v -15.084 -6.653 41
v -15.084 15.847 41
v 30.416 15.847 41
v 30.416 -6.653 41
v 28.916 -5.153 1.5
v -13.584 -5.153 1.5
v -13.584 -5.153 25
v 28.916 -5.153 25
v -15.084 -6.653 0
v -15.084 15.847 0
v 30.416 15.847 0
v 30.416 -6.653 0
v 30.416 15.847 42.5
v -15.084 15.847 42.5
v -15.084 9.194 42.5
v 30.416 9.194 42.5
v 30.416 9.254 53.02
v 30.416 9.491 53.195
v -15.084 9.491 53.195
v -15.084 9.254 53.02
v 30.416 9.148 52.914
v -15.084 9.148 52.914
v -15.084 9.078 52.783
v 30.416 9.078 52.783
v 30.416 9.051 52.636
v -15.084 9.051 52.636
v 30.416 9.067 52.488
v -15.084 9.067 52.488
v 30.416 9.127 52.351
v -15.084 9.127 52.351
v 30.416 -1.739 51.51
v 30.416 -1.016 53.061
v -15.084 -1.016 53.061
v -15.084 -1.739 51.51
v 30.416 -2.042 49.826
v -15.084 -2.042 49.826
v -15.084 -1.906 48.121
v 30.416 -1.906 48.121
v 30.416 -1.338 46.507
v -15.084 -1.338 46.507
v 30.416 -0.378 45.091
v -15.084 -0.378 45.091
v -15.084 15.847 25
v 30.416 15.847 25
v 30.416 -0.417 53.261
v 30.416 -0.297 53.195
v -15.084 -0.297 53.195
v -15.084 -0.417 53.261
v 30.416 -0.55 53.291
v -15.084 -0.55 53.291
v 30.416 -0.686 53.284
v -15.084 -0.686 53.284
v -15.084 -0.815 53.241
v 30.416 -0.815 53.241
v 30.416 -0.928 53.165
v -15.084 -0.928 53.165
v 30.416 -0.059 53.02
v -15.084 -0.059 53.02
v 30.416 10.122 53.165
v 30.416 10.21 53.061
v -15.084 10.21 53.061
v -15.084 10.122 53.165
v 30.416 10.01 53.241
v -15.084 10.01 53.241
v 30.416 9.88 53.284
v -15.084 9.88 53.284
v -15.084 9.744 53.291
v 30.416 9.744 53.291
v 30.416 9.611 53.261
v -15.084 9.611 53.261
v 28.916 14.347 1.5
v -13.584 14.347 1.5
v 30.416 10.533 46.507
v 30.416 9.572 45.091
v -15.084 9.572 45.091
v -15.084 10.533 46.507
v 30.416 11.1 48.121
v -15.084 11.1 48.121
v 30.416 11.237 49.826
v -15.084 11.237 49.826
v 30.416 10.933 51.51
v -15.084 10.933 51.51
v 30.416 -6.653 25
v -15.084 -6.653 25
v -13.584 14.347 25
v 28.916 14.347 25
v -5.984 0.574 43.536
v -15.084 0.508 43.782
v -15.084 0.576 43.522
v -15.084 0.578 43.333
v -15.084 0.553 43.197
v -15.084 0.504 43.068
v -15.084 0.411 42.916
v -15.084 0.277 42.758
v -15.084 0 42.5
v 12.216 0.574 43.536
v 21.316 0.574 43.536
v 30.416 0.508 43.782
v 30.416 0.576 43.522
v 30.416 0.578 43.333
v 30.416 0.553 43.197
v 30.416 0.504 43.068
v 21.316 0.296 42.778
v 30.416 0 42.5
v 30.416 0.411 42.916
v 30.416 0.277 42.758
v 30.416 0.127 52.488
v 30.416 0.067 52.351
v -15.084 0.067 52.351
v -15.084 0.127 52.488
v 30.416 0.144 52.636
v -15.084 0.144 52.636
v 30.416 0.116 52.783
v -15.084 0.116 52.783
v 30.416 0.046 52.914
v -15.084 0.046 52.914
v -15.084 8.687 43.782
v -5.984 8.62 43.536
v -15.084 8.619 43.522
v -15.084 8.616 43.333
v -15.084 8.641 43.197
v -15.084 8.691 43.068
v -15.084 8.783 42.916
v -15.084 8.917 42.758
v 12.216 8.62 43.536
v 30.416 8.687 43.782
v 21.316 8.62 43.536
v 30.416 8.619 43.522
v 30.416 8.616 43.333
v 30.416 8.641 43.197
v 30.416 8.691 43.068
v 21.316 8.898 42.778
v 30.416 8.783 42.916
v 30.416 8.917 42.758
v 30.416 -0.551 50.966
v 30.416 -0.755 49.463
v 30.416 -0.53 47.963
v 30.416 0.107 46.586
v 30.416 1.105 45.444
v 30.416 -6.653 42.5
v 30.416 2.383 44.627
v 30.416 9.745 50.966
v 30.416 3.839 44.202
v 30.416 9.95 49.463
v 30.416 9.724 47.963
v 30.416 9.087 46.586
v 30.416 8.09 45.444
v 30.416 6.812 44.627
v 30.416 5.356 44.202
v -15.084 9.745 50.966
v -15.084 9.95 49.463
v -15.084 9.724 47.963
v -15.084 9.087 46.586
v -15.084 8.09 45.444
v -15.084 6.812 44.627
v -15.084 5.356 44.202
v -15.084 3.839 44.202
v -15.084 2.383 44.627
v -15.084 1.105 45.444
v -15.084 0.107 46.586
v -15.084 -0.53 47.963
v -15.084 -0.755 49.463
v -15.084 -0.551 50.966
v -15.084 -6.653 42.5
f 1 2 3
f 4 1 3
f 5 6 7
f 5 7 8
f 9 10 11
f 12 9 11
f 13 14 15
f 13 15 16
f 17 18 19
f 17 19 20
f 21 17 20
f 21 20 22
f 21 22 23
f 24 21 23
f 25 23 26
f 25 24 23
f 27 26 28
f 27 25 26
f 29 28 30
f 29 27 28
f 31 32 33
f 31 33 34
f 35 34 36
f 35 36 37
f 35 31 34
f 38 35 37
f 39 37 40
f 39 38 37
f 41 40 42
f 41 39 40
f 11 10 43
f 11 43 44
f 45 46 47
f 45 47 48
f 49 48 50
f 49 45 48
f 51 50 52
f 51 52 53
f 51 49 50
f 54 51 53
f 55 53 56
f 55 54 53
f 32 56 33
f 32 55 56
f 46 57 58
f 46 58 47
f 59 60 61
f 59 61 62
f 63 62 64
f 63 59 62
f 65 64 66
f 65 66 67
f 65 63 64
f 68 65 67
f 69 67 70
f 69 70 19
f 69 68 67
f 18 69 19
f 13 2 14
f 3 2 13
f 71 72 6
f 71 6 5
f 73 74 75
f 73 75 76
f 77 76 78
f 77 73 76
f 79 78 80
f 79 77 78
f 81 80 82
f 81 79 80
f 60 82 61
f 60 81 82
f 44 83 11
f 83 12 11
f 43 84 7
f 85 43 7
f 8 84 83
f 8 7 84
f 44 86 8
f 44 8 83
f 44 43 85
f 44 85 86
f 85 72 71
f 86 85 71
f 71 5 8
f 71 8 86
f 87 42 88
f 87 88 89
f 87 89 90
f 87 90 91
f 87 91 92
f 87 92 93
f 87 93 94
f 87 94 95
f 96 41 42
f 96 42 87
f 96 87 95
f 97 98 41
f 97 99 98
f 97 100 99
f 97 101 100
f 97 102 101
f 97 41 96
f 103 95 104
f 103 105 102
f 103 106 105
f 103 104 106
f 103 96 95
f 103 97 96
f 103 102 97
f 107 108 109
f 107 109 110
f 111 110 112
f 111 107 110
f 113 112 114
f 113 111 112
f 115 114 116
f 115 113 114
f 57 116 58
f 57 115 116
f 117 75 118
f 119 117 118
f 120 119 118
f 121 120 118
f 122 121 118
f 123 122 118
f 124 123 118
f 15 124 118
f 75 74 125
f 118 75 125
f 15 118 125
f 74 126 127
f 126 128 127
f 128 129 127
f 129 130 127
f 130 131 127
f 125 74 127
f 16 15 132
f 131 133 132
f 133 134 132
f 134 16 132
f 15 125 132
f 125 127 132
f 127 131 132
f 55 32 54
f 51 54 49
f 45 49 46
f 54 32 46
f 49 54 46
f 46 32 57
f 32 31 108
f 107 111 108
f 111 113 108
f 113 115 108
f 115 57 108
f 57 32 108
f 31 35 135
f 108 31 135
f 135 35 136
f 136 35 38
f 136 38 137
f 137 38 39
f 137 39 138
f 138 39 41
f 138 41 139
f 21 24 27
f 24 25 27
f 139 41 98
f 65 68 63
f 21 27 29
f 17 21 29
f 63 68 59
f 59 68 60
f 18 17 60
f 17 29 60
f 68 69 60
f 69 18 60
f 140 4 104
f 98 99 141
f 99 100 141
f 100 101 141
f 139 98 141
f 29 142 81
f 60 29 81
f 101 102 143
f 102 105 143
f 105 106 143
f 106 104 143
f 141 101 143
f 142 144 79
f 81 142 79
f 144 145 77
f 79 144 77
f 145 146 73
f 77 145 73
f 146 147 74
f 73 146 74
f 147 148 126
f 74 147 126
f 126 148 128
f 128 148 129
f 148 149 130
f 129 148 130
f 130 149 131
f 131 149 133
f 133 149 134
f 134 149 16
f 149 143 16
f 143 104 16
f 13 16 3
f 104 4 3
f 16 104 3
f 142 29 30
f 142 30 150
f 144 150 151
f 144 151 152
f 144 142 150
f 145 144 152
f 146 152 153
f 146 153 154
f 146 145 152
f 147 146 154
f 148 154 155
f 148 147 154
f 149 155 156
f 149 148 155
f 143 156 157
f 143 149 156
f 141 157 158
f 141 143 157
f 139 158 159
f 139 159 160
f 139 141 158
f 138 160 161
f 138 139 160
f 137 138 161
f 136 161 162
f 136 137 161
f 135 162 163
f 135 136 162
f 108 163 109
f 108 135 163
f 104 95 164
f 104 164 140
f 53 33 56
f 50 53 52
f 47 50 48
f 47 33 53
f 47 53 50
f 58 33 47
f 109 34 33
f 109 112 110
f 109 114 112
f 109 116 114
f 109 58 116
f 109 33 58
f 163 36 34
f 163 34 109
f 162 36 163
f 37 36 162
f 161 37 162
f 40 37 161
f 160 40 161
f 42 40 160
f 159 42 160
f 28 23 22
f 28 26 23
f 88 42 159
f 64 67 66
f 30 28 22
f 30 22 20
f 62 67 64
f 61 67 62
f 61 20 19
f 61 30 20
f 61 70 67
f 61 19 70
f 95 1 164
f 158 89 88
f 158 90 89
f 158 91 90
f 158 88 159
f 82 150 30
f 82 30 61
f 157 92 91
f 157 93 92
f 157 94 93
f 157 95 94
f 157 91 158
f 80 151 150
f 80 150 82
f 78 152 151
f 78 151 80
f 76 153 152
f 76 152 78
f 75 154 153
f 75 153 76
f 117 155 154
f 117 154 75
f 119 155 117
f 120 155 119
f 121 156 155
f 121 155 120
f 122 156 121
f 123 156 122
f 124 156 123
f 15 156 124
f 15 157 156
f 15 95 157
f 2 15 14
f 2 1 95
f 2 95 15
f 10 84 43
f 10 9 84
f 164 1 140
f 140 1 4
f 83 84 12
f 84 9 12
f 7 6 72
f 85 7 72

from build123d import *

# Parameters (mm, degrees)
F0_W     = 45.5
F0_H     = 22.5
F1_DEPTH = 1.5
F3_W     = 45.5
F3_H     = 22.5
F3_W_2   = 42.4999991808
F3_H_2   = 19.4999991808
F4_DEPTH = 23.5
F6_W     = 45.5
F6_H     = 22.5
F7_DEPTH = 1.5
F9_DEPTH = 45.5


with BuildPart() as f1:
    # F0 (on Top) → F1 (new body)
    with BuildSketch(Plane.XY):
        with Locations((7.6661653073, 4.5972098559)):
            Rectangle(F0_W, F0_H)
    extrude(amount=F1_DEPTH)

    # F3 (on offset) → F4 (join)
    with BuildSketch(Plane.XY.offset(1.5)):
        with Locations((7.6661653073, 4.5972098559)):
            Rectangle(F3_W, F3_H)
        with Locations((7.6661653073, 4.5972098559)):
            Rectangle(F3_W_2, F3_H_2, mode=Mode.SUBTRACT)
    extrude(amount=F4_DEPTH)


with BuildPart() as f7:
    # F6 (on offset) → F7 (new body)
    with BuildSketch(Plane.XY.offset(41)):
        with Locations((7.6661653073, 4.5972098559)):
            Rectangle(F6_W, F6_H)
    extrude(amount=F7_DEPTH)

    # F8 (on face) → F9 (join)
    with BuildSketch(Plane.YZ.offset(30.4161653073)):
        with BuildLine():
            add(Edge.make_bspline(
                [(-0.3777872455, 45.0912016029), (-0.1039396637, 44.7333429632), (0.3693333154, 44.1370098593), (0.6120724501, 43.5610906711), (0.5634119243, 43.1087799015), (0.3050337288, 42.7663792708), (0.1013277006, 42.5884866561), (0, 42.5)],
                knots=[0, 0, 0, 0, 0.2924817046, 0.4944795212, 0.6638319838, 0.8328508189, 1, 1, 1, 1], degree=3))
            Line((0, 42.5), (9.1944197118, 42.5))
            add(Edge.make_bspline(
                [(9.5722069573, 45.0912016029), (9.2983593755, 44.7333429632), (8.8250863964, 44.1370098593), (8.5823472618, 43.5610906711), (8.6310077876, 43.1087799015), (8.889385983, 42.7663792708), (9.0930920113, 42.5884866561), (9.1944197118, 42.5)],
                knots=[0, 0, 0, 0, 0.2924817046, 0.4944795212, 0.6638319838, 0.8328508189, 1, 1, 1, 1], degree=3))
            ThreePointArc((9.5722069573, 45.0912016029), (11.2234063009, 48.9693210595), (10.2104767237, 53.0608053213))
            ThreePointArc((10.2104767237, 53.0608053213), (9.8802490575, 53.2844370105), (9.4914952255, 53.1953757836))
            Line((9.4914952255, 53.1953757836), (9.2535319566, 53.019881494))
            ThreePointArc((9.2535319566, 53.019881494), (9.0589970851, 52.7103338144), (9.1271389426, 52.3511398983))
            ThreePointArc((9.1271389426, 52.3511398983), (4.5972098559, 44.1475), (0.0672807693, 52.3511398983))
            ThreePointArc((0.0672807693, 52.3511398983), (0.1354226267, 52.7103338144), (-0.0591122447, 53.019881494))
            Line((-0.0591122447, 53.019881494), (-0.2970755137, 53.1953757836))
            ThreePointArc((-0.2970755137, 53.1953757836), (-0.6858293456, 53.2844370105), (-1.0160570119, 53.0608053213))
            ThreePointArc((-1.0160570119, 53.0608053213), (-2.028986589, 48.9693210595), (-0.3777872455, 45.0912016029))
        make_face()
    extrude(amount=-F9_DEPTH)


solid = Compound([f1.part, f7.part])
